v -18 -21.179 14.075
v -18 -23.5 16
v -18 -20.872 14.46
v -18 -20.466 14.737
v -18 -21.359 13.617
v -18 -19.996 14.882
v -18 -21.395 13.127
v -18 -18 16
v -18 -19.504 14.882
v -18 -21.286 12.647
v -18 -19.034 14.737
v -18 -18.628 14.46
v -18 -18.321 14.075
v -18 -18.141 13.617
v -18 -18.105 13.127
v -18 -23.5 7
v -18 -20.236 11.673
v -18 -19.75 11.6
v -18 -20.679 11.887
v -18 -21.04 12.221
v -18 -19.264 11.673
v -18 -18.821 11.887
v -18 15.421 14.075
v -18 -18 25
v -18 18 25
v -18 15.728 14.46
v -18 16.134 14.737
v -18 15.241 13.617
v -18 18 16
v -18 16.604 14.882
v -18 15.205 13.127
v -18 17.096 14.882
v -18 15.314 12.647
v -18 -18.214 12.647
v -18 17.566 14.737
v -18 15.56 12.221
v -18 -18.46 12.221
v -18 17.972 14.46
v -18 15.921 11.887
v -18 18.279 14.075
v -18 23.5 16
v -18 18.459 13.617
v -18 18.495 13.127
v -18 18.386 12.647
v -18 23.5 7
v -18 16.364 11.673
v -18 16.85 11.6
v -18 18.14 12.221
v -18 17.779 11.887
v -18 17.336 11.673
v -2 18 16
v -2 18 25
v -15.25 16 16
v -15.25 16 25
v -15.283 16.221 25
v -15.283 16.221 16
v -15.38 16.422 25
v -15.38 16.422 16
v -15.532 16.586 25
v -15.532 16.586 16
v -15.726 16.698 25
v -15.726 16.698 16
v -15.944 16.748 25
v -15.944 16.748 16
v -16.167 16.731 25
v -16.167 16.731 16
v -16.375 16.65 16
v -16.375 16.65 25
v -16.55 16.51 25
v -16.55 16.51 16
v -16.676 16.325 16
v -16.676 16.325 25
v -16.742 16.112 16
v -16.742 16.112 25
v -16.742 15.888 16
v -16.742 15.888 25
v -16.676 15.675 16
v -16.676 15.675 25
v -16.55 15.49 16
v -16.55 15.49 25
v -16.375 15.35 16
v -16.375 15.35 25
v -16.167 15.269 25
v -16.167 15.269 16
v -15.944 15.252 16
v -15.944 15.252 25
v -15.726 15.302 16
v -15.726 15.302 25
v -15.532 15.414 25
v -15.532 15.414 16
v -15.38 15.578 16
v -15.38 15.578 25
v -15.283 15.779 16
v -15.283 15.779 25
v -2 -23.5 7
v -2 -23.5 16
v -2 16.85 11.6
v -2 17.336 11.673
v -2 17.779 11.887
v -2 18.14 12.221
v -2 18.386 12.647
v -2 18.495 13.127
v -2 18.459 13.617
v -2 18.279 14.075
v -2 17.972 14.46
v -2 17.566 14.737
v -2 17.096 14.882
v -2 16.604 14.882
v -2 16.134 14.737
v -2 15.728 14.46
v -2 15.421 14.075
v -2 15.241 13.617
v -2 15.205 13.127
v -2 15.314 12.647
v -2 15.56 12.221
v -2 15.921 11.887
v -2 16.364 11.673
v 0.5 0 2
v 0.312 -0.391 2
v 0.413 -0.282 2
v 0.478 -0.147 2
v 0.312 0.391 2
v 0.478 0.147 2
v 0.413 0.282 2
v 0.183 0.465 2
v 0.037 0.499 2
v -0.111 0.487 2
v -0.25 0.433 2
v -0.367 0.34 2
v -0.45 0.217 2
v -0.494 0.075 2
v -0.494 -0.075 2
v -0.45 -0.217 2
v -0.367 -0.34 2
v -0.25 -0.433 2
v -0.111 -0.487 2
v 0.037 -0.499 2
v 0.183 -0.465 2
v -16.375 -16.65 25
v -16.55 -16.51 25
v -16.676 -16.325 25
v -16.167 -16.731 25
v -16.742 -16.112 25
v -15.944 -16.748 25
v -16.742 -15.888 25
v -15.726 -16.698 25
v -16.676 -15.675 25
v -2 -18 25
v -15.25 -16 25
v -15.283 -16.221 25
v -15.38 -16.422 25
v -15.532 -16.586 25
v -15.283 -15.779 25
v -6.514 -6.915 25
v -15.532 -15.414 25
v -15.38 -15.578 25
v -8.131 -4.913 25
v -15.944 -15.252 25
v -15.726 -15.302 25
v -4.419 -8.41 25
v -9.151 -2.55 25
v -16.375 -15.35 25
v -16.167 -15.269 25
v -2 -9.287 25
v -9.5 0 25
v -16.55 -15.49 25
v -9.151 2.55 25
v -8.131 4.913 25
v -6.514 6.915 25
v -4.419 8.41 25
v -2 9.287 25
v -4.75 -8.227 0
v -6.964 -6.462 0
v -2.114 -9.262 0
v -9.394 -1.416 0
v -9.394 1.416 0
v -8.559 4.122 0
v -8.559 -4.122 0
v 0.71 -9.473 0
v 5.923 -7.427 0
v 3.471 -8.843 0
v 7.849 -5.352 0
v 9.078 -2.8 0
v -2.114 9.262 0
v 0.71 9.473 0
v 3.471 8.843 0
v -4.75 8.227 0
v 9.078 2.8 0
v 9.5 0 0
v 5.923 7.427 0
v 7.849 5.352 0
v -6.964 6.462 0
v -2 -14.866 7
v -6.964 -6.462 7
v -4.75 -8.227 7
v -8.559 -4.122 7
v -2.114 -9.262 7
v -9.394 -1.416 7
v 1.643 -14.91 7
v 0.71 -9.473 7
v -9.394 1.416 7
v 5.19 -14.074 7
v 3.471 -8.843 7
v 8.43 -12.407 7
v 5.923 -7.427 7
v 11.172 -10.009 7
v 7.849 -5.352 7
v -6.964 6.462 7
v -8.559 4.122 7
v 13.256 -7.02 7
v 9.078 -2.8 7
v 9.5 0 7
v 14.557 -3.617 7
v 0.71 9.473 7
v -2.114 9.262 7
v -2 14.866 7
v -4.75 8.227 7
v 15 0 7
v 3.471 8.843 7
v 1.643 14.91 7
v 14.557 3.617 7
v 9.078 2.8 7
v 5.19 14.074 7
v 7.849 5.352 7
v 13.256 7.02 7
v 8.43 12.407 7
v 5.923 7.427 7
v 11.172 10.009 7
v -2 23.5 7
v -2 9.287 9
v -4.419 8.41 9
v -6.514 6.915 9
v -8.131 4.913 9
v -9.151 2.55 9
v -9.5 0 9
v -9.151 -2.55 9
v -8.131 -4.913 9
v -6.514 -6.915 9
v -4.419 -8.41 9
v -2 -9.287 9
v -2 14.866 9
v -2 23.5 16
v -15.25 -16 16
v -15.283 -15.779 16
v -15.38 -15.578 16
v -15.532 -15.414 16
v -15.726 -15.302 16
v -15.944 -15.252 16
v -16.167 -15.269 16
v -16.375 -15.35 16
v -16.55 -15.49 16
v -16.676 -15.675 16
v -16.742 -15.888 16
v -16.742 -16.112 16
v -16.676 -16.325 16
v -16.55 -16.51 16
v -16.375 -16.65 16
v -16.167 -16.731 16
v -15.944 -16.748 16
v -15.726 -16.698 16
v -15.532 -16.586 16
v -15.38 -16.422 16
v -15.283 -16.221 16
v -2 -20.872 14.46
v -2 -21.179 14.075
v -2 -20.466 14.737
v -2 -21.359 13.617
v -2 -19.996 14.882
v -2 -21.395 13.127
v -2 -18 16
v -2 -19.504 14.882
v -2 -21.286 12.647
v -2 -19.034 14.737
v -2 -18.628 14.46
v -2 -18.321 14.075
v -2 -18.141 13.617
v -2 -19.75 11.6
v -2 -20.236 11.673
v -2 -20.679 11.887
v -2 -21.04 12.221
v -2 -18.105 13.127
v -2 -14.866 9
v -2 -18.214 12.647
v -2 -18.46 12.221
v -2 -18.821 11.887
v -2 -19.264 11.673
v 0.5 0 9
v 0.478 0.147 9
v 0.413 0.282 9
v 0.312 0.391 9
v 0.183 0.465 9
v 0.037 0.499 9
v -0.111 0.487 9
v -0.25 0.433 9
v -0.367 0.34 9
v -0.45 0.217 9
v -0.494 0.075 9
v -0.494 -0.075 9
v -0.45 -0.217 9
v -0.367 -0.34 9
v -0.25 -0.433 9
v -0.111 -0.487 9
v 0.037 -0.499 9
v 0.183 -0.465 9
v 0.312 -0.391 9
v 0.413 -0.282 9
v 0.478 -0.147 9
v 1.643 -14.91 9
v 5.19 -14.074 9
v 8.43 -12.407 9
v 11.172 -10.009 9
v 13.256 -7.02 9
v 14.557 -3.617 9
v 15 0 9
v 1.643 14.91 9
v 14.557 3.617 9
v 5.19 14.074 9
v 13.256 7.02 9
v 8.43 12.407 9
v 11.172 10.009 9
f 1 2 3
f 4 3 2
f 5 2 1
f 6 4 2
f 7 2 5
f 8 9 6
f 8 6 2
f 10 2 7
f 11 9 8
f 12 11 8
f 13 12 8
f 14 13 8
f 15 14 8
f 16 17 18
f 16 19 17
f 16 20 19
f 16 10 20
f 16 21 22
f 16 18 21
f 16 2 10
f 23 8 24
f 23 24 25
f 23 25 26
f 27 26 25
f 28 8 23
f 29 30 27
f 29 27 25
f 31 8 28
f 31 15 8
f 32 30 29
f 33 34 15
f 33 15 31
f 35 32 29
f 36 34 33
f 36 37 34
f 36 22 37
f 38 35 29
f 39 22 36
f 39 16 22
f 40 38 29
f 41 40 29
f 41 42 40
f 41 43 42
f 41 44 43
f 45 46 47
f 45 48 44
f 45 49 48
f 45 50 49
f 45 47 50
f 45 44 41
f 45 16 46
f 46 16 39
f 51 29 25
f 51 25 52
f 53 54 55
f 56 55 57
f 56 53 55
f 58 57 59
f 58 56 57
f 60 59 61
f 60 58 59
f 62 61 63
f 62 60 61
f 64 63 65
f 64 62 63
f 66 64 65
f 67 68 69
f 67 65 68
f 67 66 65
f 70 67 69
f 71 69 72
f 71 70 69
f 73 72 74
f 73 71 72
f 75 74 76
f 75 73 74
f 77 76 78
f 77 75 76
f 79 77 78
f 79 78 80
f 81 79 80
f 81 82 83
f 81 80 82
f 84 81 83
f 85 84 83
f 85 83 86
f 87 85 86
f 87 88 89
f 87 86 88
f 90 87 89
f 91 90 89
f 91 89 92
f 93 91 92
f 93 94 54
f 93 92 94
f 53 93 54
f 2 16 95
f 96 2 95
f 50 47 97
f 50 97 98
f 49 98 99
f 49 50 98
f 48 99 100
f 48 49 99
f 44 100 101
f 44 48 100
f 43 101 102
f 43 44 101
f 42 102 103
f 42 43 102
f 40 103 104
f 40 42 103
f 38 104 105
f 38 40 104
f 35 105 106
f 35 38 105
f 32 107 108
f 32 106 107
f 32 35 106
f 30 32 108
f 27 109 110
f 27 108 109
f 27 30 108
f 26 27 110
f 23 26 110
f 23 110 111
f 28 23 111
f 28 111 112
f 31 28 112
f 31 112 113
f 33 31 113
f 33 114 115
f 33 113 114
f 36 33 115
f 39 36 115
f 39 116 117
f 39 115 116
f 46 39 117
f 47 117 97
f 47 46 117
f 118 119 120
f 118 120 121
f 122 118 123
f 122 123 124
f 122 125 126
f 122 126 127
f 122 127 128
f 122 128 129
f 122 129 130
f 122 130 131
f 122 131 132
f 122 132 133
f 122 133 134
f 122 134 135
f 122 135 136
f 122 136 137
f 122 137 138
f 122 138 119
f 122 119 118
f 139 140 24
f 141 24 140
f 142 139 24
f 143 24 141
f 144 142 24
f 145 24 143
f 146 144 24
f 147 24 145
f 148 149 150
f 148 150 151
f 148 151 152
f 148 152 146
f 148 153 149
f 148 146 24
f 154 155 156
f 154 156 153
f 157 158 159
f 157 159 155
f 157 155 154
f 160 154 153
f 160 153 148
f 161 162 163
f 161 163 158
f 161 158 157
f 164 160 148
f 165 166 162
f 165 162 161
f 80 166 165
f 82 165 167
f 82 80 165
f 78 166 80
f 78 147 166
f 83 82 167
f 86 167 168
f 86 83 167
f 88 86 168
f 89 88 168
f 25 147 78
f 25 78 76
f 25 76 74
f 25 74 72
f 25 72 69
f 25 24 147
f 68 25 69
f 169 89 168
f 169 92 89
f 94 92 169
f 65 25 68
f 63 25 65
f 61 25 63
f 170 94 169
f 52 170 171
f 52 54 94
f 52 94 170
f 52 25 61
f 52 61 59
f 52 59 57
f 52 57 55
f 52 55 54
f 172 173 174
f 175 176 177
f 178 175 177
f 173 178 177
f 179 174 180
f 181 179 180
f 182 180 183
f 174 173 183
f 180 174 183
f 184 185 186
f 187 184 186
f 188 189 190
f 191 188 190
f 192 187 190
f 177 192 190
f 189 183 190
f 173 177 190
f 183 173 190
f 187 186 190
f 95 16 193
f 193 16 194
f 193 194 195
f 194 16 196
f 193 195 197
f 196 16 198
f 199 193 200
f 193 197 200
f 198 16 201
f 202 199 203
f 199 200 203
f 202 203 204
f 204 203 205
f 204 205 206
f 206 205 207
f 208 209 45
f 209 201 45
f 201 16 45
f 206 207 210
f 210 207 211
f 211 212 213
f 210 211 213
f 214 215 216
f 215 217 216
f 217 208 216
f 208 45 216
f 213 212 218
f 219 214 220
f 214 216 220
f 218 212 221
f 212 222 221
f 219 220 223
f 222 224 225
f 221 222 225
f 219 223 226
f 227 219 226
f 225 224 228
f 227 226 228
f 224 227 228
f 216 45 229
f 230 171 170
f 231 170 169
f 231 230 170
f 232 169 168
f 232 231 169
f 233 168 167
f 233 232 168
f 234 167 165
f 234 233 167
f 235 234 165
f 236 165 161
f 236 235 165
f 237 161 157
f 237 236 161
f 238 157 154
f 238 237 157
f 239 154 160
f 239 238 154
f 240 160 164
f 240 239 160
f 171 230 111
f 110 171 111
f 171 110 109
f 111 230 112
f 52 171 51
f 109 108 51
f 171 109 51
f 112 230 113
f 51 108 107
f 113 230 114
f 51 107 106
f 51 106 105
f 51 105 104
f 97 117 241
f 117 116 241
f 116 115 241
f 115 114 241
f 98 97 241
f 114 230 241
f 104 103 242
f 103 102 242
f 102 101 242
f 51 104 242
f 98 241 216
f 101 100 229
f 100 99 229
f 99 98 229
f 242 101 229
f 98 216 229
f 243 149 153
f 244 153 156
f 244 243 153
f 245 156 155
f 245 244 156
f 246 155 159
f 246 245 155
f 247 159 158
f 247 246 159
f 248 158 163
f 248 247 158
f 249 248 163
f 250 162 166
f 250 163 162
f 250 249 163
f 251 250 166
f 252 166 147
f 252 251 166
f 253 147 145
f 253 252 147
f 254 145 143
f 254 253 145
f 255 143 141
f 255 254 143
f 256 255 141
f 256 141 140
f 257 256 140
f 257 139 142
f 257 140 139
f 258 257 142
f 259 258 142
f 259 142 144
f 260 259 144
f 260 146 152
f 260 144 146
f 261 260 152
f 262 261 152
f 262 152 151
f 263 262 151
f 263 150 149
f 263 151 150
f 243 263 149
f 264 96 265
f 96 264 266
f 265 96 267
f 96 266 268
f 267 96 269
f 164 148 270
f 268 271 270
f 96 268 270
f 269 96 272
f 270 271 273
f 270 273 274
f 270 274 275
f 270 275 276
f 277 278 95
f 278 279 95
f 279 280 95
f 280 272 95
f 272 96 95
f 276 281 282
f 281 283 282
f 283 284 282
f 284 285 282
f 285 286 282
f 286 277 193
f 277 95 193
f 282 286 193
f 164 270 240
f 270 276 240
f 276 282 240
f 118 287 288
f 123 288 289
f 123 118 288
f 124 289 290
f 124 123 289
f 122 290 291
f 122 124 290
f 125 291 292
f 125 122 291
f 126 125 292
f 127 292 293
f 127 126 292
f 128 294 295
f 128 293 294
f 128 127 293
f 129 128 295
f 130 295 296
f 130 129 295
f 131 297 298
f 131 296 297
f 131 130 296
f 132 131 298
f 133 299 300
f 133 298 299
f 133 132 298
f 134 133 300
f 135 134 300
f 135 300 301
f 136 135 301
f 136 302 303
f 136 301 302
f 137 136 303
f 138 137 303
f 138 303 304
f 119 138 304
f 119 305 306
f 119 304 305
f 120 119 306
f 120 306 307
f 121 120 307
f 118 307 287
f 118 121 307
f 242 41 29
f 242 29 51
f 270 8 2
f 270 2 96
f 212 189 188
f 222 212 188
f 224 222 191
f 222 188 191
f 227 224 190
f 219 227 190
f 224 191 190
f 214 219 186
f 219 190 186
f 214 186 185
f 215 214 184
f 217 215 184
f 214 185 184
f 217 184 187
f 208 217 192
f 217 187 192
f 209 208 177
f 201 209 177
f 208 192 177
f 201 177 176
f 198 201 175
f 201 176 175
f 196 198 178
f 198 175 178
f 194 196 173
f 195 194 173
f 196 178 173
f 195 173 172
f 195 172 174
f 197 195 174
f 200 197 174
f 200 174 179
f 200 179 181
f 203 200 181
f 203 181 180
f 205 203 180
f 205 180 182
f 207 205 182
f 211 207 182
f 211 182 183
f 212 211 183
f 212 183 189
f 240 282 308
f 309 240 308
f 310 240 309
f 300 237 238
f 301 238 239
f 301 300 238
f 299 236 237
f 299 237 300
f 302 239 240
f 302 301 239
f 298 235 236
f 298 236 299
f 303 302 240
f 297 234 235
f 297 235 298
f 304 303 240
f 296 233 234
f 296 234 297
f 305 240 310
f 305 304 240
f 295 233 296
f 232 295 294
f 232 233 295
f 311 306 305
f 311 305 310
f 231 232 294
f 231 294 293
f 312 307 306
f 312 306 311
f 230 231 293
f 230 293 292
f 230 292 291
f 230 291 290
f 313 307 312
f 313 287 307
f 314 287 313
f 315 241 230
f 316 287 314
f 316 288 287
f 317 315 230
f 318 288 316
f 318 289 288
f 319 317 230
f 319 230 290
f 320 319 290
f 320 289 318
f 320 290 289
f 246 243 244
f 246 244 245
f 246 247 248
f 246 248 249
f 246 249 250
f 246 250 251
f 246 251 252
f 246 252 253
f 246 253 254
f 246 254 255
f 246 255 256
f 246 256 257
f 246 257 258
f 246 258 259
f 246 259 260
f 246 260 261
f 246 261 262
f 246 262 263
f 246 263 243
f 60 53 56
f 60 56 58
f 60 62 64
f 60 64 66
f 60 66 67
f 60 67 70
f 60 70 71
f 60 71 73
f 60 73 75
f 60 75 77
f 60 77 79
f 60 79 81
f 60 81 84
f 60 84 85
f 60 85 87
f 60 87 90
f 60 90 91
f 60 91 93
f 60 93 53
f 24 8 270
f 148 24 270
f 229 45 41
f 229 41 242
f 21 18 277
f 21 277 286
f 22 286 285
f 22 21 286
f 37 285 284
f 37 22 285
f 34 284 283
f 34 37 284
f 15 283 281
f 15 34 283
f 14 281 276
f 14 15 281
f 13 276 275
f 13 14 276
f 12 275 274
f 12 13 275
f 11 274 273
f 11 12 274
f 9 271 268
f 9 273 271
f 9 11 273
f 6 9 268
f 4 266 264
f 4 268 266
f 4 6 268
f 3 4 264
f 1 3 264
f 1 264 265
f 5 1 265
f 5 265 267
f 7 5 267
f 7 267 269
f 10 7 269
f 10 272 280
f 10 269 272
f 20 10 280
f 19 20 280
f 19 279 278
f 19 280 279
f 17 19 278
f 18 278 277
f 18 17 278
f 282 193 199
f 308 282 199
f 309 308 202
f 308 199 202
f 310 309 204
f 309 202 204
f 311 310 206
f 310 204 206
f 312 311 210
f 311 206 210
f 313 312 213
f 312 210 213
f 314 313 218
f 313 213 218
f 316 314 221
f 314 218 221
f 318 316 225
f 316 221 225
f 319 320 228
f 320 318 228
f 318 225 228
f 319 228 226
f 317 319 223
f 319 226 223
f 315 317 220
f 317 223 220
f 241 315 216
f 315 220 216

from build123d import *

# Parameters (mm, degrees)
CYLINDER011_R     = 0.5
CYLINDER011_DEPTH = 10
CYLINDER010_R     = 9.5
CYLINDER010_DEPTH = 50
CYLINDER009_R     = 0.75
CYLINDER009_DEPTH = 10
CYLINDER008_R     = 0.75
CYLINDER008_DEPTH = 10
CYLINDER007_R     = 1.65
CYLINDER007_DEPTH = 100
CYLINDER006_R     = 1.65
CYLINDER006_DEPTH = 100
CYLINDER001_R     = 15
CYLINDER001_DEPTH = 2
BOX003_W          = 16
BOX003_H          = 36
BOX003_DEPTH      = 16
BOX004_W          = 16
BOX004_H          = 47
BOX004_DEPTH      = 9
CYLINDER_R        = 9.5
CYLINDER_DEPTH    = 7


with BuildPart() as zylinder011:
    # Cylinder011 → Cylinder011 (new body)
    with BuildSketch(Plane.XY.offset(2)):
        Circle(CYLINDER011_R)
    extrude(amount=CYLINDER011_DEPTH)


with BuildPart() as zylinder010:
    # Cylinder010 → Cylinder010 (new body)
    with BuildSketch(Plane.XY.offset(9)):
        Circle(CYLINDER010_R)
    extrude(amount=CYLINDER010_DEPTH)


with BuildPart() as zylinder009:
    # Cylinder009 → Cylinder009 (new body)
    with BuildSketch(Plane(origin=(-16, -16, 16), x_dir=(1, 0, 0), z_dir=(0, 0, 1))):
        Circle(CYLINDER009_R)
    extrude(amount=CYLINDER009_DEPTH)


with BuildPart() as m1_holes_for_modulation_coil:
    # Cylinder008 → Cylinder008 (new body)
    with BuildSketch(Plane(origin=(-16, 16, 16), x_dir=(1, 0, 0), z_dir=(0, 0, 1))):
        Circle(CYLINDER008_R)
    extrude(amount=CYLINDER008_DEPTH)

    # Compound004: union Zylinder009
    add(zylinder009.part)


with BuildPart() as zylinder007:
    # Cylinder007 → Cylinder007 (new body)
    with BuildSketch(Plane(origin=(-40, -19.75, 13.25), x_dir=(0, 0, -1), z_dir=(1, 0, 0))):
        Circle(CYLINDER007_R)
    extrude(amount=CYLINDER007_DEPTH)


with BuildPart() as compound003:
    # Cylinder006 → Cylinder006 (new body)
    with BuildSketch(Plane(origin=(-40, 16.85, 13.25), x_dir=(0, 0, -1), z_dir=(1, 0, 0))):
        Circle(CYLINDER006_R)
    extrude(amount=CYLINDER006_DEPTH)

    # Compound003: union Zylinder007
    add(zylinder007.part)


with BuildPart() as zylinder001:
    # Cylinder001 → Cylinder001 (new body)
    with BuildSketch(Plane.XY.offset(7)):
        Circle(CYLINDER001_R)
    extrude(amount=CYLINDER001_DEPTH)


with BuildPart() as w_rfel003:
    # Box003 → Box003 (new body)
    with BuildSketch(Plane(origin=(-18, -18, 9), x_dir=(1, 0, 0), z_dir=(0, 0, 1))):
        with Locations((8, 18)):
            Rectangle(BOX003_W, BOX003_H)
    extrude(amount=BOX003_DEPTH)


with BuildPart() as w_rfel004:
    # Box004 → Box004 (new body)
    with BuildSketch(Plane(origin=(-18, -23.5, 7), x_dir=(1, 0, 0), z_dir=(0, 0, 1))):
        with Locations((8, 23.5)):
            Rectangle(BOX004_W, BOX004_H)
    extrude(amount=BOX004_DEPTH)


with BuildPart() as cut005:
    # Cylinder → Cylinder (new body)
    with BuildSketch(Plane.XY):
        Circle(CYLINDER_R)
    extrude(amount=CYLINDER_DEPTH)

    # Fusion: union Zylinder001, Würfel003, Würfel004
    add(zylinder001.part)
    add(w_rfel003.part)
    add(w_rfel004.part)

    # Cut002: cut Compound003
    add(compound003.part, mode=Mode.SUBTRACT)

    # Cut003: cut M1 holes for modulation coil
    add(m1_holes_for_modulation_coil.part, mode=Mode.SUBTRACT)

    # Cut004: cut Zylinder010
    add(zylinder010.part, mode=Mode.SUBTRACT)

    # Cut005: cut Zylinder011
    add(zylinder011.part, mode=Mode.SUBTRACT)


solid = cut005.part
